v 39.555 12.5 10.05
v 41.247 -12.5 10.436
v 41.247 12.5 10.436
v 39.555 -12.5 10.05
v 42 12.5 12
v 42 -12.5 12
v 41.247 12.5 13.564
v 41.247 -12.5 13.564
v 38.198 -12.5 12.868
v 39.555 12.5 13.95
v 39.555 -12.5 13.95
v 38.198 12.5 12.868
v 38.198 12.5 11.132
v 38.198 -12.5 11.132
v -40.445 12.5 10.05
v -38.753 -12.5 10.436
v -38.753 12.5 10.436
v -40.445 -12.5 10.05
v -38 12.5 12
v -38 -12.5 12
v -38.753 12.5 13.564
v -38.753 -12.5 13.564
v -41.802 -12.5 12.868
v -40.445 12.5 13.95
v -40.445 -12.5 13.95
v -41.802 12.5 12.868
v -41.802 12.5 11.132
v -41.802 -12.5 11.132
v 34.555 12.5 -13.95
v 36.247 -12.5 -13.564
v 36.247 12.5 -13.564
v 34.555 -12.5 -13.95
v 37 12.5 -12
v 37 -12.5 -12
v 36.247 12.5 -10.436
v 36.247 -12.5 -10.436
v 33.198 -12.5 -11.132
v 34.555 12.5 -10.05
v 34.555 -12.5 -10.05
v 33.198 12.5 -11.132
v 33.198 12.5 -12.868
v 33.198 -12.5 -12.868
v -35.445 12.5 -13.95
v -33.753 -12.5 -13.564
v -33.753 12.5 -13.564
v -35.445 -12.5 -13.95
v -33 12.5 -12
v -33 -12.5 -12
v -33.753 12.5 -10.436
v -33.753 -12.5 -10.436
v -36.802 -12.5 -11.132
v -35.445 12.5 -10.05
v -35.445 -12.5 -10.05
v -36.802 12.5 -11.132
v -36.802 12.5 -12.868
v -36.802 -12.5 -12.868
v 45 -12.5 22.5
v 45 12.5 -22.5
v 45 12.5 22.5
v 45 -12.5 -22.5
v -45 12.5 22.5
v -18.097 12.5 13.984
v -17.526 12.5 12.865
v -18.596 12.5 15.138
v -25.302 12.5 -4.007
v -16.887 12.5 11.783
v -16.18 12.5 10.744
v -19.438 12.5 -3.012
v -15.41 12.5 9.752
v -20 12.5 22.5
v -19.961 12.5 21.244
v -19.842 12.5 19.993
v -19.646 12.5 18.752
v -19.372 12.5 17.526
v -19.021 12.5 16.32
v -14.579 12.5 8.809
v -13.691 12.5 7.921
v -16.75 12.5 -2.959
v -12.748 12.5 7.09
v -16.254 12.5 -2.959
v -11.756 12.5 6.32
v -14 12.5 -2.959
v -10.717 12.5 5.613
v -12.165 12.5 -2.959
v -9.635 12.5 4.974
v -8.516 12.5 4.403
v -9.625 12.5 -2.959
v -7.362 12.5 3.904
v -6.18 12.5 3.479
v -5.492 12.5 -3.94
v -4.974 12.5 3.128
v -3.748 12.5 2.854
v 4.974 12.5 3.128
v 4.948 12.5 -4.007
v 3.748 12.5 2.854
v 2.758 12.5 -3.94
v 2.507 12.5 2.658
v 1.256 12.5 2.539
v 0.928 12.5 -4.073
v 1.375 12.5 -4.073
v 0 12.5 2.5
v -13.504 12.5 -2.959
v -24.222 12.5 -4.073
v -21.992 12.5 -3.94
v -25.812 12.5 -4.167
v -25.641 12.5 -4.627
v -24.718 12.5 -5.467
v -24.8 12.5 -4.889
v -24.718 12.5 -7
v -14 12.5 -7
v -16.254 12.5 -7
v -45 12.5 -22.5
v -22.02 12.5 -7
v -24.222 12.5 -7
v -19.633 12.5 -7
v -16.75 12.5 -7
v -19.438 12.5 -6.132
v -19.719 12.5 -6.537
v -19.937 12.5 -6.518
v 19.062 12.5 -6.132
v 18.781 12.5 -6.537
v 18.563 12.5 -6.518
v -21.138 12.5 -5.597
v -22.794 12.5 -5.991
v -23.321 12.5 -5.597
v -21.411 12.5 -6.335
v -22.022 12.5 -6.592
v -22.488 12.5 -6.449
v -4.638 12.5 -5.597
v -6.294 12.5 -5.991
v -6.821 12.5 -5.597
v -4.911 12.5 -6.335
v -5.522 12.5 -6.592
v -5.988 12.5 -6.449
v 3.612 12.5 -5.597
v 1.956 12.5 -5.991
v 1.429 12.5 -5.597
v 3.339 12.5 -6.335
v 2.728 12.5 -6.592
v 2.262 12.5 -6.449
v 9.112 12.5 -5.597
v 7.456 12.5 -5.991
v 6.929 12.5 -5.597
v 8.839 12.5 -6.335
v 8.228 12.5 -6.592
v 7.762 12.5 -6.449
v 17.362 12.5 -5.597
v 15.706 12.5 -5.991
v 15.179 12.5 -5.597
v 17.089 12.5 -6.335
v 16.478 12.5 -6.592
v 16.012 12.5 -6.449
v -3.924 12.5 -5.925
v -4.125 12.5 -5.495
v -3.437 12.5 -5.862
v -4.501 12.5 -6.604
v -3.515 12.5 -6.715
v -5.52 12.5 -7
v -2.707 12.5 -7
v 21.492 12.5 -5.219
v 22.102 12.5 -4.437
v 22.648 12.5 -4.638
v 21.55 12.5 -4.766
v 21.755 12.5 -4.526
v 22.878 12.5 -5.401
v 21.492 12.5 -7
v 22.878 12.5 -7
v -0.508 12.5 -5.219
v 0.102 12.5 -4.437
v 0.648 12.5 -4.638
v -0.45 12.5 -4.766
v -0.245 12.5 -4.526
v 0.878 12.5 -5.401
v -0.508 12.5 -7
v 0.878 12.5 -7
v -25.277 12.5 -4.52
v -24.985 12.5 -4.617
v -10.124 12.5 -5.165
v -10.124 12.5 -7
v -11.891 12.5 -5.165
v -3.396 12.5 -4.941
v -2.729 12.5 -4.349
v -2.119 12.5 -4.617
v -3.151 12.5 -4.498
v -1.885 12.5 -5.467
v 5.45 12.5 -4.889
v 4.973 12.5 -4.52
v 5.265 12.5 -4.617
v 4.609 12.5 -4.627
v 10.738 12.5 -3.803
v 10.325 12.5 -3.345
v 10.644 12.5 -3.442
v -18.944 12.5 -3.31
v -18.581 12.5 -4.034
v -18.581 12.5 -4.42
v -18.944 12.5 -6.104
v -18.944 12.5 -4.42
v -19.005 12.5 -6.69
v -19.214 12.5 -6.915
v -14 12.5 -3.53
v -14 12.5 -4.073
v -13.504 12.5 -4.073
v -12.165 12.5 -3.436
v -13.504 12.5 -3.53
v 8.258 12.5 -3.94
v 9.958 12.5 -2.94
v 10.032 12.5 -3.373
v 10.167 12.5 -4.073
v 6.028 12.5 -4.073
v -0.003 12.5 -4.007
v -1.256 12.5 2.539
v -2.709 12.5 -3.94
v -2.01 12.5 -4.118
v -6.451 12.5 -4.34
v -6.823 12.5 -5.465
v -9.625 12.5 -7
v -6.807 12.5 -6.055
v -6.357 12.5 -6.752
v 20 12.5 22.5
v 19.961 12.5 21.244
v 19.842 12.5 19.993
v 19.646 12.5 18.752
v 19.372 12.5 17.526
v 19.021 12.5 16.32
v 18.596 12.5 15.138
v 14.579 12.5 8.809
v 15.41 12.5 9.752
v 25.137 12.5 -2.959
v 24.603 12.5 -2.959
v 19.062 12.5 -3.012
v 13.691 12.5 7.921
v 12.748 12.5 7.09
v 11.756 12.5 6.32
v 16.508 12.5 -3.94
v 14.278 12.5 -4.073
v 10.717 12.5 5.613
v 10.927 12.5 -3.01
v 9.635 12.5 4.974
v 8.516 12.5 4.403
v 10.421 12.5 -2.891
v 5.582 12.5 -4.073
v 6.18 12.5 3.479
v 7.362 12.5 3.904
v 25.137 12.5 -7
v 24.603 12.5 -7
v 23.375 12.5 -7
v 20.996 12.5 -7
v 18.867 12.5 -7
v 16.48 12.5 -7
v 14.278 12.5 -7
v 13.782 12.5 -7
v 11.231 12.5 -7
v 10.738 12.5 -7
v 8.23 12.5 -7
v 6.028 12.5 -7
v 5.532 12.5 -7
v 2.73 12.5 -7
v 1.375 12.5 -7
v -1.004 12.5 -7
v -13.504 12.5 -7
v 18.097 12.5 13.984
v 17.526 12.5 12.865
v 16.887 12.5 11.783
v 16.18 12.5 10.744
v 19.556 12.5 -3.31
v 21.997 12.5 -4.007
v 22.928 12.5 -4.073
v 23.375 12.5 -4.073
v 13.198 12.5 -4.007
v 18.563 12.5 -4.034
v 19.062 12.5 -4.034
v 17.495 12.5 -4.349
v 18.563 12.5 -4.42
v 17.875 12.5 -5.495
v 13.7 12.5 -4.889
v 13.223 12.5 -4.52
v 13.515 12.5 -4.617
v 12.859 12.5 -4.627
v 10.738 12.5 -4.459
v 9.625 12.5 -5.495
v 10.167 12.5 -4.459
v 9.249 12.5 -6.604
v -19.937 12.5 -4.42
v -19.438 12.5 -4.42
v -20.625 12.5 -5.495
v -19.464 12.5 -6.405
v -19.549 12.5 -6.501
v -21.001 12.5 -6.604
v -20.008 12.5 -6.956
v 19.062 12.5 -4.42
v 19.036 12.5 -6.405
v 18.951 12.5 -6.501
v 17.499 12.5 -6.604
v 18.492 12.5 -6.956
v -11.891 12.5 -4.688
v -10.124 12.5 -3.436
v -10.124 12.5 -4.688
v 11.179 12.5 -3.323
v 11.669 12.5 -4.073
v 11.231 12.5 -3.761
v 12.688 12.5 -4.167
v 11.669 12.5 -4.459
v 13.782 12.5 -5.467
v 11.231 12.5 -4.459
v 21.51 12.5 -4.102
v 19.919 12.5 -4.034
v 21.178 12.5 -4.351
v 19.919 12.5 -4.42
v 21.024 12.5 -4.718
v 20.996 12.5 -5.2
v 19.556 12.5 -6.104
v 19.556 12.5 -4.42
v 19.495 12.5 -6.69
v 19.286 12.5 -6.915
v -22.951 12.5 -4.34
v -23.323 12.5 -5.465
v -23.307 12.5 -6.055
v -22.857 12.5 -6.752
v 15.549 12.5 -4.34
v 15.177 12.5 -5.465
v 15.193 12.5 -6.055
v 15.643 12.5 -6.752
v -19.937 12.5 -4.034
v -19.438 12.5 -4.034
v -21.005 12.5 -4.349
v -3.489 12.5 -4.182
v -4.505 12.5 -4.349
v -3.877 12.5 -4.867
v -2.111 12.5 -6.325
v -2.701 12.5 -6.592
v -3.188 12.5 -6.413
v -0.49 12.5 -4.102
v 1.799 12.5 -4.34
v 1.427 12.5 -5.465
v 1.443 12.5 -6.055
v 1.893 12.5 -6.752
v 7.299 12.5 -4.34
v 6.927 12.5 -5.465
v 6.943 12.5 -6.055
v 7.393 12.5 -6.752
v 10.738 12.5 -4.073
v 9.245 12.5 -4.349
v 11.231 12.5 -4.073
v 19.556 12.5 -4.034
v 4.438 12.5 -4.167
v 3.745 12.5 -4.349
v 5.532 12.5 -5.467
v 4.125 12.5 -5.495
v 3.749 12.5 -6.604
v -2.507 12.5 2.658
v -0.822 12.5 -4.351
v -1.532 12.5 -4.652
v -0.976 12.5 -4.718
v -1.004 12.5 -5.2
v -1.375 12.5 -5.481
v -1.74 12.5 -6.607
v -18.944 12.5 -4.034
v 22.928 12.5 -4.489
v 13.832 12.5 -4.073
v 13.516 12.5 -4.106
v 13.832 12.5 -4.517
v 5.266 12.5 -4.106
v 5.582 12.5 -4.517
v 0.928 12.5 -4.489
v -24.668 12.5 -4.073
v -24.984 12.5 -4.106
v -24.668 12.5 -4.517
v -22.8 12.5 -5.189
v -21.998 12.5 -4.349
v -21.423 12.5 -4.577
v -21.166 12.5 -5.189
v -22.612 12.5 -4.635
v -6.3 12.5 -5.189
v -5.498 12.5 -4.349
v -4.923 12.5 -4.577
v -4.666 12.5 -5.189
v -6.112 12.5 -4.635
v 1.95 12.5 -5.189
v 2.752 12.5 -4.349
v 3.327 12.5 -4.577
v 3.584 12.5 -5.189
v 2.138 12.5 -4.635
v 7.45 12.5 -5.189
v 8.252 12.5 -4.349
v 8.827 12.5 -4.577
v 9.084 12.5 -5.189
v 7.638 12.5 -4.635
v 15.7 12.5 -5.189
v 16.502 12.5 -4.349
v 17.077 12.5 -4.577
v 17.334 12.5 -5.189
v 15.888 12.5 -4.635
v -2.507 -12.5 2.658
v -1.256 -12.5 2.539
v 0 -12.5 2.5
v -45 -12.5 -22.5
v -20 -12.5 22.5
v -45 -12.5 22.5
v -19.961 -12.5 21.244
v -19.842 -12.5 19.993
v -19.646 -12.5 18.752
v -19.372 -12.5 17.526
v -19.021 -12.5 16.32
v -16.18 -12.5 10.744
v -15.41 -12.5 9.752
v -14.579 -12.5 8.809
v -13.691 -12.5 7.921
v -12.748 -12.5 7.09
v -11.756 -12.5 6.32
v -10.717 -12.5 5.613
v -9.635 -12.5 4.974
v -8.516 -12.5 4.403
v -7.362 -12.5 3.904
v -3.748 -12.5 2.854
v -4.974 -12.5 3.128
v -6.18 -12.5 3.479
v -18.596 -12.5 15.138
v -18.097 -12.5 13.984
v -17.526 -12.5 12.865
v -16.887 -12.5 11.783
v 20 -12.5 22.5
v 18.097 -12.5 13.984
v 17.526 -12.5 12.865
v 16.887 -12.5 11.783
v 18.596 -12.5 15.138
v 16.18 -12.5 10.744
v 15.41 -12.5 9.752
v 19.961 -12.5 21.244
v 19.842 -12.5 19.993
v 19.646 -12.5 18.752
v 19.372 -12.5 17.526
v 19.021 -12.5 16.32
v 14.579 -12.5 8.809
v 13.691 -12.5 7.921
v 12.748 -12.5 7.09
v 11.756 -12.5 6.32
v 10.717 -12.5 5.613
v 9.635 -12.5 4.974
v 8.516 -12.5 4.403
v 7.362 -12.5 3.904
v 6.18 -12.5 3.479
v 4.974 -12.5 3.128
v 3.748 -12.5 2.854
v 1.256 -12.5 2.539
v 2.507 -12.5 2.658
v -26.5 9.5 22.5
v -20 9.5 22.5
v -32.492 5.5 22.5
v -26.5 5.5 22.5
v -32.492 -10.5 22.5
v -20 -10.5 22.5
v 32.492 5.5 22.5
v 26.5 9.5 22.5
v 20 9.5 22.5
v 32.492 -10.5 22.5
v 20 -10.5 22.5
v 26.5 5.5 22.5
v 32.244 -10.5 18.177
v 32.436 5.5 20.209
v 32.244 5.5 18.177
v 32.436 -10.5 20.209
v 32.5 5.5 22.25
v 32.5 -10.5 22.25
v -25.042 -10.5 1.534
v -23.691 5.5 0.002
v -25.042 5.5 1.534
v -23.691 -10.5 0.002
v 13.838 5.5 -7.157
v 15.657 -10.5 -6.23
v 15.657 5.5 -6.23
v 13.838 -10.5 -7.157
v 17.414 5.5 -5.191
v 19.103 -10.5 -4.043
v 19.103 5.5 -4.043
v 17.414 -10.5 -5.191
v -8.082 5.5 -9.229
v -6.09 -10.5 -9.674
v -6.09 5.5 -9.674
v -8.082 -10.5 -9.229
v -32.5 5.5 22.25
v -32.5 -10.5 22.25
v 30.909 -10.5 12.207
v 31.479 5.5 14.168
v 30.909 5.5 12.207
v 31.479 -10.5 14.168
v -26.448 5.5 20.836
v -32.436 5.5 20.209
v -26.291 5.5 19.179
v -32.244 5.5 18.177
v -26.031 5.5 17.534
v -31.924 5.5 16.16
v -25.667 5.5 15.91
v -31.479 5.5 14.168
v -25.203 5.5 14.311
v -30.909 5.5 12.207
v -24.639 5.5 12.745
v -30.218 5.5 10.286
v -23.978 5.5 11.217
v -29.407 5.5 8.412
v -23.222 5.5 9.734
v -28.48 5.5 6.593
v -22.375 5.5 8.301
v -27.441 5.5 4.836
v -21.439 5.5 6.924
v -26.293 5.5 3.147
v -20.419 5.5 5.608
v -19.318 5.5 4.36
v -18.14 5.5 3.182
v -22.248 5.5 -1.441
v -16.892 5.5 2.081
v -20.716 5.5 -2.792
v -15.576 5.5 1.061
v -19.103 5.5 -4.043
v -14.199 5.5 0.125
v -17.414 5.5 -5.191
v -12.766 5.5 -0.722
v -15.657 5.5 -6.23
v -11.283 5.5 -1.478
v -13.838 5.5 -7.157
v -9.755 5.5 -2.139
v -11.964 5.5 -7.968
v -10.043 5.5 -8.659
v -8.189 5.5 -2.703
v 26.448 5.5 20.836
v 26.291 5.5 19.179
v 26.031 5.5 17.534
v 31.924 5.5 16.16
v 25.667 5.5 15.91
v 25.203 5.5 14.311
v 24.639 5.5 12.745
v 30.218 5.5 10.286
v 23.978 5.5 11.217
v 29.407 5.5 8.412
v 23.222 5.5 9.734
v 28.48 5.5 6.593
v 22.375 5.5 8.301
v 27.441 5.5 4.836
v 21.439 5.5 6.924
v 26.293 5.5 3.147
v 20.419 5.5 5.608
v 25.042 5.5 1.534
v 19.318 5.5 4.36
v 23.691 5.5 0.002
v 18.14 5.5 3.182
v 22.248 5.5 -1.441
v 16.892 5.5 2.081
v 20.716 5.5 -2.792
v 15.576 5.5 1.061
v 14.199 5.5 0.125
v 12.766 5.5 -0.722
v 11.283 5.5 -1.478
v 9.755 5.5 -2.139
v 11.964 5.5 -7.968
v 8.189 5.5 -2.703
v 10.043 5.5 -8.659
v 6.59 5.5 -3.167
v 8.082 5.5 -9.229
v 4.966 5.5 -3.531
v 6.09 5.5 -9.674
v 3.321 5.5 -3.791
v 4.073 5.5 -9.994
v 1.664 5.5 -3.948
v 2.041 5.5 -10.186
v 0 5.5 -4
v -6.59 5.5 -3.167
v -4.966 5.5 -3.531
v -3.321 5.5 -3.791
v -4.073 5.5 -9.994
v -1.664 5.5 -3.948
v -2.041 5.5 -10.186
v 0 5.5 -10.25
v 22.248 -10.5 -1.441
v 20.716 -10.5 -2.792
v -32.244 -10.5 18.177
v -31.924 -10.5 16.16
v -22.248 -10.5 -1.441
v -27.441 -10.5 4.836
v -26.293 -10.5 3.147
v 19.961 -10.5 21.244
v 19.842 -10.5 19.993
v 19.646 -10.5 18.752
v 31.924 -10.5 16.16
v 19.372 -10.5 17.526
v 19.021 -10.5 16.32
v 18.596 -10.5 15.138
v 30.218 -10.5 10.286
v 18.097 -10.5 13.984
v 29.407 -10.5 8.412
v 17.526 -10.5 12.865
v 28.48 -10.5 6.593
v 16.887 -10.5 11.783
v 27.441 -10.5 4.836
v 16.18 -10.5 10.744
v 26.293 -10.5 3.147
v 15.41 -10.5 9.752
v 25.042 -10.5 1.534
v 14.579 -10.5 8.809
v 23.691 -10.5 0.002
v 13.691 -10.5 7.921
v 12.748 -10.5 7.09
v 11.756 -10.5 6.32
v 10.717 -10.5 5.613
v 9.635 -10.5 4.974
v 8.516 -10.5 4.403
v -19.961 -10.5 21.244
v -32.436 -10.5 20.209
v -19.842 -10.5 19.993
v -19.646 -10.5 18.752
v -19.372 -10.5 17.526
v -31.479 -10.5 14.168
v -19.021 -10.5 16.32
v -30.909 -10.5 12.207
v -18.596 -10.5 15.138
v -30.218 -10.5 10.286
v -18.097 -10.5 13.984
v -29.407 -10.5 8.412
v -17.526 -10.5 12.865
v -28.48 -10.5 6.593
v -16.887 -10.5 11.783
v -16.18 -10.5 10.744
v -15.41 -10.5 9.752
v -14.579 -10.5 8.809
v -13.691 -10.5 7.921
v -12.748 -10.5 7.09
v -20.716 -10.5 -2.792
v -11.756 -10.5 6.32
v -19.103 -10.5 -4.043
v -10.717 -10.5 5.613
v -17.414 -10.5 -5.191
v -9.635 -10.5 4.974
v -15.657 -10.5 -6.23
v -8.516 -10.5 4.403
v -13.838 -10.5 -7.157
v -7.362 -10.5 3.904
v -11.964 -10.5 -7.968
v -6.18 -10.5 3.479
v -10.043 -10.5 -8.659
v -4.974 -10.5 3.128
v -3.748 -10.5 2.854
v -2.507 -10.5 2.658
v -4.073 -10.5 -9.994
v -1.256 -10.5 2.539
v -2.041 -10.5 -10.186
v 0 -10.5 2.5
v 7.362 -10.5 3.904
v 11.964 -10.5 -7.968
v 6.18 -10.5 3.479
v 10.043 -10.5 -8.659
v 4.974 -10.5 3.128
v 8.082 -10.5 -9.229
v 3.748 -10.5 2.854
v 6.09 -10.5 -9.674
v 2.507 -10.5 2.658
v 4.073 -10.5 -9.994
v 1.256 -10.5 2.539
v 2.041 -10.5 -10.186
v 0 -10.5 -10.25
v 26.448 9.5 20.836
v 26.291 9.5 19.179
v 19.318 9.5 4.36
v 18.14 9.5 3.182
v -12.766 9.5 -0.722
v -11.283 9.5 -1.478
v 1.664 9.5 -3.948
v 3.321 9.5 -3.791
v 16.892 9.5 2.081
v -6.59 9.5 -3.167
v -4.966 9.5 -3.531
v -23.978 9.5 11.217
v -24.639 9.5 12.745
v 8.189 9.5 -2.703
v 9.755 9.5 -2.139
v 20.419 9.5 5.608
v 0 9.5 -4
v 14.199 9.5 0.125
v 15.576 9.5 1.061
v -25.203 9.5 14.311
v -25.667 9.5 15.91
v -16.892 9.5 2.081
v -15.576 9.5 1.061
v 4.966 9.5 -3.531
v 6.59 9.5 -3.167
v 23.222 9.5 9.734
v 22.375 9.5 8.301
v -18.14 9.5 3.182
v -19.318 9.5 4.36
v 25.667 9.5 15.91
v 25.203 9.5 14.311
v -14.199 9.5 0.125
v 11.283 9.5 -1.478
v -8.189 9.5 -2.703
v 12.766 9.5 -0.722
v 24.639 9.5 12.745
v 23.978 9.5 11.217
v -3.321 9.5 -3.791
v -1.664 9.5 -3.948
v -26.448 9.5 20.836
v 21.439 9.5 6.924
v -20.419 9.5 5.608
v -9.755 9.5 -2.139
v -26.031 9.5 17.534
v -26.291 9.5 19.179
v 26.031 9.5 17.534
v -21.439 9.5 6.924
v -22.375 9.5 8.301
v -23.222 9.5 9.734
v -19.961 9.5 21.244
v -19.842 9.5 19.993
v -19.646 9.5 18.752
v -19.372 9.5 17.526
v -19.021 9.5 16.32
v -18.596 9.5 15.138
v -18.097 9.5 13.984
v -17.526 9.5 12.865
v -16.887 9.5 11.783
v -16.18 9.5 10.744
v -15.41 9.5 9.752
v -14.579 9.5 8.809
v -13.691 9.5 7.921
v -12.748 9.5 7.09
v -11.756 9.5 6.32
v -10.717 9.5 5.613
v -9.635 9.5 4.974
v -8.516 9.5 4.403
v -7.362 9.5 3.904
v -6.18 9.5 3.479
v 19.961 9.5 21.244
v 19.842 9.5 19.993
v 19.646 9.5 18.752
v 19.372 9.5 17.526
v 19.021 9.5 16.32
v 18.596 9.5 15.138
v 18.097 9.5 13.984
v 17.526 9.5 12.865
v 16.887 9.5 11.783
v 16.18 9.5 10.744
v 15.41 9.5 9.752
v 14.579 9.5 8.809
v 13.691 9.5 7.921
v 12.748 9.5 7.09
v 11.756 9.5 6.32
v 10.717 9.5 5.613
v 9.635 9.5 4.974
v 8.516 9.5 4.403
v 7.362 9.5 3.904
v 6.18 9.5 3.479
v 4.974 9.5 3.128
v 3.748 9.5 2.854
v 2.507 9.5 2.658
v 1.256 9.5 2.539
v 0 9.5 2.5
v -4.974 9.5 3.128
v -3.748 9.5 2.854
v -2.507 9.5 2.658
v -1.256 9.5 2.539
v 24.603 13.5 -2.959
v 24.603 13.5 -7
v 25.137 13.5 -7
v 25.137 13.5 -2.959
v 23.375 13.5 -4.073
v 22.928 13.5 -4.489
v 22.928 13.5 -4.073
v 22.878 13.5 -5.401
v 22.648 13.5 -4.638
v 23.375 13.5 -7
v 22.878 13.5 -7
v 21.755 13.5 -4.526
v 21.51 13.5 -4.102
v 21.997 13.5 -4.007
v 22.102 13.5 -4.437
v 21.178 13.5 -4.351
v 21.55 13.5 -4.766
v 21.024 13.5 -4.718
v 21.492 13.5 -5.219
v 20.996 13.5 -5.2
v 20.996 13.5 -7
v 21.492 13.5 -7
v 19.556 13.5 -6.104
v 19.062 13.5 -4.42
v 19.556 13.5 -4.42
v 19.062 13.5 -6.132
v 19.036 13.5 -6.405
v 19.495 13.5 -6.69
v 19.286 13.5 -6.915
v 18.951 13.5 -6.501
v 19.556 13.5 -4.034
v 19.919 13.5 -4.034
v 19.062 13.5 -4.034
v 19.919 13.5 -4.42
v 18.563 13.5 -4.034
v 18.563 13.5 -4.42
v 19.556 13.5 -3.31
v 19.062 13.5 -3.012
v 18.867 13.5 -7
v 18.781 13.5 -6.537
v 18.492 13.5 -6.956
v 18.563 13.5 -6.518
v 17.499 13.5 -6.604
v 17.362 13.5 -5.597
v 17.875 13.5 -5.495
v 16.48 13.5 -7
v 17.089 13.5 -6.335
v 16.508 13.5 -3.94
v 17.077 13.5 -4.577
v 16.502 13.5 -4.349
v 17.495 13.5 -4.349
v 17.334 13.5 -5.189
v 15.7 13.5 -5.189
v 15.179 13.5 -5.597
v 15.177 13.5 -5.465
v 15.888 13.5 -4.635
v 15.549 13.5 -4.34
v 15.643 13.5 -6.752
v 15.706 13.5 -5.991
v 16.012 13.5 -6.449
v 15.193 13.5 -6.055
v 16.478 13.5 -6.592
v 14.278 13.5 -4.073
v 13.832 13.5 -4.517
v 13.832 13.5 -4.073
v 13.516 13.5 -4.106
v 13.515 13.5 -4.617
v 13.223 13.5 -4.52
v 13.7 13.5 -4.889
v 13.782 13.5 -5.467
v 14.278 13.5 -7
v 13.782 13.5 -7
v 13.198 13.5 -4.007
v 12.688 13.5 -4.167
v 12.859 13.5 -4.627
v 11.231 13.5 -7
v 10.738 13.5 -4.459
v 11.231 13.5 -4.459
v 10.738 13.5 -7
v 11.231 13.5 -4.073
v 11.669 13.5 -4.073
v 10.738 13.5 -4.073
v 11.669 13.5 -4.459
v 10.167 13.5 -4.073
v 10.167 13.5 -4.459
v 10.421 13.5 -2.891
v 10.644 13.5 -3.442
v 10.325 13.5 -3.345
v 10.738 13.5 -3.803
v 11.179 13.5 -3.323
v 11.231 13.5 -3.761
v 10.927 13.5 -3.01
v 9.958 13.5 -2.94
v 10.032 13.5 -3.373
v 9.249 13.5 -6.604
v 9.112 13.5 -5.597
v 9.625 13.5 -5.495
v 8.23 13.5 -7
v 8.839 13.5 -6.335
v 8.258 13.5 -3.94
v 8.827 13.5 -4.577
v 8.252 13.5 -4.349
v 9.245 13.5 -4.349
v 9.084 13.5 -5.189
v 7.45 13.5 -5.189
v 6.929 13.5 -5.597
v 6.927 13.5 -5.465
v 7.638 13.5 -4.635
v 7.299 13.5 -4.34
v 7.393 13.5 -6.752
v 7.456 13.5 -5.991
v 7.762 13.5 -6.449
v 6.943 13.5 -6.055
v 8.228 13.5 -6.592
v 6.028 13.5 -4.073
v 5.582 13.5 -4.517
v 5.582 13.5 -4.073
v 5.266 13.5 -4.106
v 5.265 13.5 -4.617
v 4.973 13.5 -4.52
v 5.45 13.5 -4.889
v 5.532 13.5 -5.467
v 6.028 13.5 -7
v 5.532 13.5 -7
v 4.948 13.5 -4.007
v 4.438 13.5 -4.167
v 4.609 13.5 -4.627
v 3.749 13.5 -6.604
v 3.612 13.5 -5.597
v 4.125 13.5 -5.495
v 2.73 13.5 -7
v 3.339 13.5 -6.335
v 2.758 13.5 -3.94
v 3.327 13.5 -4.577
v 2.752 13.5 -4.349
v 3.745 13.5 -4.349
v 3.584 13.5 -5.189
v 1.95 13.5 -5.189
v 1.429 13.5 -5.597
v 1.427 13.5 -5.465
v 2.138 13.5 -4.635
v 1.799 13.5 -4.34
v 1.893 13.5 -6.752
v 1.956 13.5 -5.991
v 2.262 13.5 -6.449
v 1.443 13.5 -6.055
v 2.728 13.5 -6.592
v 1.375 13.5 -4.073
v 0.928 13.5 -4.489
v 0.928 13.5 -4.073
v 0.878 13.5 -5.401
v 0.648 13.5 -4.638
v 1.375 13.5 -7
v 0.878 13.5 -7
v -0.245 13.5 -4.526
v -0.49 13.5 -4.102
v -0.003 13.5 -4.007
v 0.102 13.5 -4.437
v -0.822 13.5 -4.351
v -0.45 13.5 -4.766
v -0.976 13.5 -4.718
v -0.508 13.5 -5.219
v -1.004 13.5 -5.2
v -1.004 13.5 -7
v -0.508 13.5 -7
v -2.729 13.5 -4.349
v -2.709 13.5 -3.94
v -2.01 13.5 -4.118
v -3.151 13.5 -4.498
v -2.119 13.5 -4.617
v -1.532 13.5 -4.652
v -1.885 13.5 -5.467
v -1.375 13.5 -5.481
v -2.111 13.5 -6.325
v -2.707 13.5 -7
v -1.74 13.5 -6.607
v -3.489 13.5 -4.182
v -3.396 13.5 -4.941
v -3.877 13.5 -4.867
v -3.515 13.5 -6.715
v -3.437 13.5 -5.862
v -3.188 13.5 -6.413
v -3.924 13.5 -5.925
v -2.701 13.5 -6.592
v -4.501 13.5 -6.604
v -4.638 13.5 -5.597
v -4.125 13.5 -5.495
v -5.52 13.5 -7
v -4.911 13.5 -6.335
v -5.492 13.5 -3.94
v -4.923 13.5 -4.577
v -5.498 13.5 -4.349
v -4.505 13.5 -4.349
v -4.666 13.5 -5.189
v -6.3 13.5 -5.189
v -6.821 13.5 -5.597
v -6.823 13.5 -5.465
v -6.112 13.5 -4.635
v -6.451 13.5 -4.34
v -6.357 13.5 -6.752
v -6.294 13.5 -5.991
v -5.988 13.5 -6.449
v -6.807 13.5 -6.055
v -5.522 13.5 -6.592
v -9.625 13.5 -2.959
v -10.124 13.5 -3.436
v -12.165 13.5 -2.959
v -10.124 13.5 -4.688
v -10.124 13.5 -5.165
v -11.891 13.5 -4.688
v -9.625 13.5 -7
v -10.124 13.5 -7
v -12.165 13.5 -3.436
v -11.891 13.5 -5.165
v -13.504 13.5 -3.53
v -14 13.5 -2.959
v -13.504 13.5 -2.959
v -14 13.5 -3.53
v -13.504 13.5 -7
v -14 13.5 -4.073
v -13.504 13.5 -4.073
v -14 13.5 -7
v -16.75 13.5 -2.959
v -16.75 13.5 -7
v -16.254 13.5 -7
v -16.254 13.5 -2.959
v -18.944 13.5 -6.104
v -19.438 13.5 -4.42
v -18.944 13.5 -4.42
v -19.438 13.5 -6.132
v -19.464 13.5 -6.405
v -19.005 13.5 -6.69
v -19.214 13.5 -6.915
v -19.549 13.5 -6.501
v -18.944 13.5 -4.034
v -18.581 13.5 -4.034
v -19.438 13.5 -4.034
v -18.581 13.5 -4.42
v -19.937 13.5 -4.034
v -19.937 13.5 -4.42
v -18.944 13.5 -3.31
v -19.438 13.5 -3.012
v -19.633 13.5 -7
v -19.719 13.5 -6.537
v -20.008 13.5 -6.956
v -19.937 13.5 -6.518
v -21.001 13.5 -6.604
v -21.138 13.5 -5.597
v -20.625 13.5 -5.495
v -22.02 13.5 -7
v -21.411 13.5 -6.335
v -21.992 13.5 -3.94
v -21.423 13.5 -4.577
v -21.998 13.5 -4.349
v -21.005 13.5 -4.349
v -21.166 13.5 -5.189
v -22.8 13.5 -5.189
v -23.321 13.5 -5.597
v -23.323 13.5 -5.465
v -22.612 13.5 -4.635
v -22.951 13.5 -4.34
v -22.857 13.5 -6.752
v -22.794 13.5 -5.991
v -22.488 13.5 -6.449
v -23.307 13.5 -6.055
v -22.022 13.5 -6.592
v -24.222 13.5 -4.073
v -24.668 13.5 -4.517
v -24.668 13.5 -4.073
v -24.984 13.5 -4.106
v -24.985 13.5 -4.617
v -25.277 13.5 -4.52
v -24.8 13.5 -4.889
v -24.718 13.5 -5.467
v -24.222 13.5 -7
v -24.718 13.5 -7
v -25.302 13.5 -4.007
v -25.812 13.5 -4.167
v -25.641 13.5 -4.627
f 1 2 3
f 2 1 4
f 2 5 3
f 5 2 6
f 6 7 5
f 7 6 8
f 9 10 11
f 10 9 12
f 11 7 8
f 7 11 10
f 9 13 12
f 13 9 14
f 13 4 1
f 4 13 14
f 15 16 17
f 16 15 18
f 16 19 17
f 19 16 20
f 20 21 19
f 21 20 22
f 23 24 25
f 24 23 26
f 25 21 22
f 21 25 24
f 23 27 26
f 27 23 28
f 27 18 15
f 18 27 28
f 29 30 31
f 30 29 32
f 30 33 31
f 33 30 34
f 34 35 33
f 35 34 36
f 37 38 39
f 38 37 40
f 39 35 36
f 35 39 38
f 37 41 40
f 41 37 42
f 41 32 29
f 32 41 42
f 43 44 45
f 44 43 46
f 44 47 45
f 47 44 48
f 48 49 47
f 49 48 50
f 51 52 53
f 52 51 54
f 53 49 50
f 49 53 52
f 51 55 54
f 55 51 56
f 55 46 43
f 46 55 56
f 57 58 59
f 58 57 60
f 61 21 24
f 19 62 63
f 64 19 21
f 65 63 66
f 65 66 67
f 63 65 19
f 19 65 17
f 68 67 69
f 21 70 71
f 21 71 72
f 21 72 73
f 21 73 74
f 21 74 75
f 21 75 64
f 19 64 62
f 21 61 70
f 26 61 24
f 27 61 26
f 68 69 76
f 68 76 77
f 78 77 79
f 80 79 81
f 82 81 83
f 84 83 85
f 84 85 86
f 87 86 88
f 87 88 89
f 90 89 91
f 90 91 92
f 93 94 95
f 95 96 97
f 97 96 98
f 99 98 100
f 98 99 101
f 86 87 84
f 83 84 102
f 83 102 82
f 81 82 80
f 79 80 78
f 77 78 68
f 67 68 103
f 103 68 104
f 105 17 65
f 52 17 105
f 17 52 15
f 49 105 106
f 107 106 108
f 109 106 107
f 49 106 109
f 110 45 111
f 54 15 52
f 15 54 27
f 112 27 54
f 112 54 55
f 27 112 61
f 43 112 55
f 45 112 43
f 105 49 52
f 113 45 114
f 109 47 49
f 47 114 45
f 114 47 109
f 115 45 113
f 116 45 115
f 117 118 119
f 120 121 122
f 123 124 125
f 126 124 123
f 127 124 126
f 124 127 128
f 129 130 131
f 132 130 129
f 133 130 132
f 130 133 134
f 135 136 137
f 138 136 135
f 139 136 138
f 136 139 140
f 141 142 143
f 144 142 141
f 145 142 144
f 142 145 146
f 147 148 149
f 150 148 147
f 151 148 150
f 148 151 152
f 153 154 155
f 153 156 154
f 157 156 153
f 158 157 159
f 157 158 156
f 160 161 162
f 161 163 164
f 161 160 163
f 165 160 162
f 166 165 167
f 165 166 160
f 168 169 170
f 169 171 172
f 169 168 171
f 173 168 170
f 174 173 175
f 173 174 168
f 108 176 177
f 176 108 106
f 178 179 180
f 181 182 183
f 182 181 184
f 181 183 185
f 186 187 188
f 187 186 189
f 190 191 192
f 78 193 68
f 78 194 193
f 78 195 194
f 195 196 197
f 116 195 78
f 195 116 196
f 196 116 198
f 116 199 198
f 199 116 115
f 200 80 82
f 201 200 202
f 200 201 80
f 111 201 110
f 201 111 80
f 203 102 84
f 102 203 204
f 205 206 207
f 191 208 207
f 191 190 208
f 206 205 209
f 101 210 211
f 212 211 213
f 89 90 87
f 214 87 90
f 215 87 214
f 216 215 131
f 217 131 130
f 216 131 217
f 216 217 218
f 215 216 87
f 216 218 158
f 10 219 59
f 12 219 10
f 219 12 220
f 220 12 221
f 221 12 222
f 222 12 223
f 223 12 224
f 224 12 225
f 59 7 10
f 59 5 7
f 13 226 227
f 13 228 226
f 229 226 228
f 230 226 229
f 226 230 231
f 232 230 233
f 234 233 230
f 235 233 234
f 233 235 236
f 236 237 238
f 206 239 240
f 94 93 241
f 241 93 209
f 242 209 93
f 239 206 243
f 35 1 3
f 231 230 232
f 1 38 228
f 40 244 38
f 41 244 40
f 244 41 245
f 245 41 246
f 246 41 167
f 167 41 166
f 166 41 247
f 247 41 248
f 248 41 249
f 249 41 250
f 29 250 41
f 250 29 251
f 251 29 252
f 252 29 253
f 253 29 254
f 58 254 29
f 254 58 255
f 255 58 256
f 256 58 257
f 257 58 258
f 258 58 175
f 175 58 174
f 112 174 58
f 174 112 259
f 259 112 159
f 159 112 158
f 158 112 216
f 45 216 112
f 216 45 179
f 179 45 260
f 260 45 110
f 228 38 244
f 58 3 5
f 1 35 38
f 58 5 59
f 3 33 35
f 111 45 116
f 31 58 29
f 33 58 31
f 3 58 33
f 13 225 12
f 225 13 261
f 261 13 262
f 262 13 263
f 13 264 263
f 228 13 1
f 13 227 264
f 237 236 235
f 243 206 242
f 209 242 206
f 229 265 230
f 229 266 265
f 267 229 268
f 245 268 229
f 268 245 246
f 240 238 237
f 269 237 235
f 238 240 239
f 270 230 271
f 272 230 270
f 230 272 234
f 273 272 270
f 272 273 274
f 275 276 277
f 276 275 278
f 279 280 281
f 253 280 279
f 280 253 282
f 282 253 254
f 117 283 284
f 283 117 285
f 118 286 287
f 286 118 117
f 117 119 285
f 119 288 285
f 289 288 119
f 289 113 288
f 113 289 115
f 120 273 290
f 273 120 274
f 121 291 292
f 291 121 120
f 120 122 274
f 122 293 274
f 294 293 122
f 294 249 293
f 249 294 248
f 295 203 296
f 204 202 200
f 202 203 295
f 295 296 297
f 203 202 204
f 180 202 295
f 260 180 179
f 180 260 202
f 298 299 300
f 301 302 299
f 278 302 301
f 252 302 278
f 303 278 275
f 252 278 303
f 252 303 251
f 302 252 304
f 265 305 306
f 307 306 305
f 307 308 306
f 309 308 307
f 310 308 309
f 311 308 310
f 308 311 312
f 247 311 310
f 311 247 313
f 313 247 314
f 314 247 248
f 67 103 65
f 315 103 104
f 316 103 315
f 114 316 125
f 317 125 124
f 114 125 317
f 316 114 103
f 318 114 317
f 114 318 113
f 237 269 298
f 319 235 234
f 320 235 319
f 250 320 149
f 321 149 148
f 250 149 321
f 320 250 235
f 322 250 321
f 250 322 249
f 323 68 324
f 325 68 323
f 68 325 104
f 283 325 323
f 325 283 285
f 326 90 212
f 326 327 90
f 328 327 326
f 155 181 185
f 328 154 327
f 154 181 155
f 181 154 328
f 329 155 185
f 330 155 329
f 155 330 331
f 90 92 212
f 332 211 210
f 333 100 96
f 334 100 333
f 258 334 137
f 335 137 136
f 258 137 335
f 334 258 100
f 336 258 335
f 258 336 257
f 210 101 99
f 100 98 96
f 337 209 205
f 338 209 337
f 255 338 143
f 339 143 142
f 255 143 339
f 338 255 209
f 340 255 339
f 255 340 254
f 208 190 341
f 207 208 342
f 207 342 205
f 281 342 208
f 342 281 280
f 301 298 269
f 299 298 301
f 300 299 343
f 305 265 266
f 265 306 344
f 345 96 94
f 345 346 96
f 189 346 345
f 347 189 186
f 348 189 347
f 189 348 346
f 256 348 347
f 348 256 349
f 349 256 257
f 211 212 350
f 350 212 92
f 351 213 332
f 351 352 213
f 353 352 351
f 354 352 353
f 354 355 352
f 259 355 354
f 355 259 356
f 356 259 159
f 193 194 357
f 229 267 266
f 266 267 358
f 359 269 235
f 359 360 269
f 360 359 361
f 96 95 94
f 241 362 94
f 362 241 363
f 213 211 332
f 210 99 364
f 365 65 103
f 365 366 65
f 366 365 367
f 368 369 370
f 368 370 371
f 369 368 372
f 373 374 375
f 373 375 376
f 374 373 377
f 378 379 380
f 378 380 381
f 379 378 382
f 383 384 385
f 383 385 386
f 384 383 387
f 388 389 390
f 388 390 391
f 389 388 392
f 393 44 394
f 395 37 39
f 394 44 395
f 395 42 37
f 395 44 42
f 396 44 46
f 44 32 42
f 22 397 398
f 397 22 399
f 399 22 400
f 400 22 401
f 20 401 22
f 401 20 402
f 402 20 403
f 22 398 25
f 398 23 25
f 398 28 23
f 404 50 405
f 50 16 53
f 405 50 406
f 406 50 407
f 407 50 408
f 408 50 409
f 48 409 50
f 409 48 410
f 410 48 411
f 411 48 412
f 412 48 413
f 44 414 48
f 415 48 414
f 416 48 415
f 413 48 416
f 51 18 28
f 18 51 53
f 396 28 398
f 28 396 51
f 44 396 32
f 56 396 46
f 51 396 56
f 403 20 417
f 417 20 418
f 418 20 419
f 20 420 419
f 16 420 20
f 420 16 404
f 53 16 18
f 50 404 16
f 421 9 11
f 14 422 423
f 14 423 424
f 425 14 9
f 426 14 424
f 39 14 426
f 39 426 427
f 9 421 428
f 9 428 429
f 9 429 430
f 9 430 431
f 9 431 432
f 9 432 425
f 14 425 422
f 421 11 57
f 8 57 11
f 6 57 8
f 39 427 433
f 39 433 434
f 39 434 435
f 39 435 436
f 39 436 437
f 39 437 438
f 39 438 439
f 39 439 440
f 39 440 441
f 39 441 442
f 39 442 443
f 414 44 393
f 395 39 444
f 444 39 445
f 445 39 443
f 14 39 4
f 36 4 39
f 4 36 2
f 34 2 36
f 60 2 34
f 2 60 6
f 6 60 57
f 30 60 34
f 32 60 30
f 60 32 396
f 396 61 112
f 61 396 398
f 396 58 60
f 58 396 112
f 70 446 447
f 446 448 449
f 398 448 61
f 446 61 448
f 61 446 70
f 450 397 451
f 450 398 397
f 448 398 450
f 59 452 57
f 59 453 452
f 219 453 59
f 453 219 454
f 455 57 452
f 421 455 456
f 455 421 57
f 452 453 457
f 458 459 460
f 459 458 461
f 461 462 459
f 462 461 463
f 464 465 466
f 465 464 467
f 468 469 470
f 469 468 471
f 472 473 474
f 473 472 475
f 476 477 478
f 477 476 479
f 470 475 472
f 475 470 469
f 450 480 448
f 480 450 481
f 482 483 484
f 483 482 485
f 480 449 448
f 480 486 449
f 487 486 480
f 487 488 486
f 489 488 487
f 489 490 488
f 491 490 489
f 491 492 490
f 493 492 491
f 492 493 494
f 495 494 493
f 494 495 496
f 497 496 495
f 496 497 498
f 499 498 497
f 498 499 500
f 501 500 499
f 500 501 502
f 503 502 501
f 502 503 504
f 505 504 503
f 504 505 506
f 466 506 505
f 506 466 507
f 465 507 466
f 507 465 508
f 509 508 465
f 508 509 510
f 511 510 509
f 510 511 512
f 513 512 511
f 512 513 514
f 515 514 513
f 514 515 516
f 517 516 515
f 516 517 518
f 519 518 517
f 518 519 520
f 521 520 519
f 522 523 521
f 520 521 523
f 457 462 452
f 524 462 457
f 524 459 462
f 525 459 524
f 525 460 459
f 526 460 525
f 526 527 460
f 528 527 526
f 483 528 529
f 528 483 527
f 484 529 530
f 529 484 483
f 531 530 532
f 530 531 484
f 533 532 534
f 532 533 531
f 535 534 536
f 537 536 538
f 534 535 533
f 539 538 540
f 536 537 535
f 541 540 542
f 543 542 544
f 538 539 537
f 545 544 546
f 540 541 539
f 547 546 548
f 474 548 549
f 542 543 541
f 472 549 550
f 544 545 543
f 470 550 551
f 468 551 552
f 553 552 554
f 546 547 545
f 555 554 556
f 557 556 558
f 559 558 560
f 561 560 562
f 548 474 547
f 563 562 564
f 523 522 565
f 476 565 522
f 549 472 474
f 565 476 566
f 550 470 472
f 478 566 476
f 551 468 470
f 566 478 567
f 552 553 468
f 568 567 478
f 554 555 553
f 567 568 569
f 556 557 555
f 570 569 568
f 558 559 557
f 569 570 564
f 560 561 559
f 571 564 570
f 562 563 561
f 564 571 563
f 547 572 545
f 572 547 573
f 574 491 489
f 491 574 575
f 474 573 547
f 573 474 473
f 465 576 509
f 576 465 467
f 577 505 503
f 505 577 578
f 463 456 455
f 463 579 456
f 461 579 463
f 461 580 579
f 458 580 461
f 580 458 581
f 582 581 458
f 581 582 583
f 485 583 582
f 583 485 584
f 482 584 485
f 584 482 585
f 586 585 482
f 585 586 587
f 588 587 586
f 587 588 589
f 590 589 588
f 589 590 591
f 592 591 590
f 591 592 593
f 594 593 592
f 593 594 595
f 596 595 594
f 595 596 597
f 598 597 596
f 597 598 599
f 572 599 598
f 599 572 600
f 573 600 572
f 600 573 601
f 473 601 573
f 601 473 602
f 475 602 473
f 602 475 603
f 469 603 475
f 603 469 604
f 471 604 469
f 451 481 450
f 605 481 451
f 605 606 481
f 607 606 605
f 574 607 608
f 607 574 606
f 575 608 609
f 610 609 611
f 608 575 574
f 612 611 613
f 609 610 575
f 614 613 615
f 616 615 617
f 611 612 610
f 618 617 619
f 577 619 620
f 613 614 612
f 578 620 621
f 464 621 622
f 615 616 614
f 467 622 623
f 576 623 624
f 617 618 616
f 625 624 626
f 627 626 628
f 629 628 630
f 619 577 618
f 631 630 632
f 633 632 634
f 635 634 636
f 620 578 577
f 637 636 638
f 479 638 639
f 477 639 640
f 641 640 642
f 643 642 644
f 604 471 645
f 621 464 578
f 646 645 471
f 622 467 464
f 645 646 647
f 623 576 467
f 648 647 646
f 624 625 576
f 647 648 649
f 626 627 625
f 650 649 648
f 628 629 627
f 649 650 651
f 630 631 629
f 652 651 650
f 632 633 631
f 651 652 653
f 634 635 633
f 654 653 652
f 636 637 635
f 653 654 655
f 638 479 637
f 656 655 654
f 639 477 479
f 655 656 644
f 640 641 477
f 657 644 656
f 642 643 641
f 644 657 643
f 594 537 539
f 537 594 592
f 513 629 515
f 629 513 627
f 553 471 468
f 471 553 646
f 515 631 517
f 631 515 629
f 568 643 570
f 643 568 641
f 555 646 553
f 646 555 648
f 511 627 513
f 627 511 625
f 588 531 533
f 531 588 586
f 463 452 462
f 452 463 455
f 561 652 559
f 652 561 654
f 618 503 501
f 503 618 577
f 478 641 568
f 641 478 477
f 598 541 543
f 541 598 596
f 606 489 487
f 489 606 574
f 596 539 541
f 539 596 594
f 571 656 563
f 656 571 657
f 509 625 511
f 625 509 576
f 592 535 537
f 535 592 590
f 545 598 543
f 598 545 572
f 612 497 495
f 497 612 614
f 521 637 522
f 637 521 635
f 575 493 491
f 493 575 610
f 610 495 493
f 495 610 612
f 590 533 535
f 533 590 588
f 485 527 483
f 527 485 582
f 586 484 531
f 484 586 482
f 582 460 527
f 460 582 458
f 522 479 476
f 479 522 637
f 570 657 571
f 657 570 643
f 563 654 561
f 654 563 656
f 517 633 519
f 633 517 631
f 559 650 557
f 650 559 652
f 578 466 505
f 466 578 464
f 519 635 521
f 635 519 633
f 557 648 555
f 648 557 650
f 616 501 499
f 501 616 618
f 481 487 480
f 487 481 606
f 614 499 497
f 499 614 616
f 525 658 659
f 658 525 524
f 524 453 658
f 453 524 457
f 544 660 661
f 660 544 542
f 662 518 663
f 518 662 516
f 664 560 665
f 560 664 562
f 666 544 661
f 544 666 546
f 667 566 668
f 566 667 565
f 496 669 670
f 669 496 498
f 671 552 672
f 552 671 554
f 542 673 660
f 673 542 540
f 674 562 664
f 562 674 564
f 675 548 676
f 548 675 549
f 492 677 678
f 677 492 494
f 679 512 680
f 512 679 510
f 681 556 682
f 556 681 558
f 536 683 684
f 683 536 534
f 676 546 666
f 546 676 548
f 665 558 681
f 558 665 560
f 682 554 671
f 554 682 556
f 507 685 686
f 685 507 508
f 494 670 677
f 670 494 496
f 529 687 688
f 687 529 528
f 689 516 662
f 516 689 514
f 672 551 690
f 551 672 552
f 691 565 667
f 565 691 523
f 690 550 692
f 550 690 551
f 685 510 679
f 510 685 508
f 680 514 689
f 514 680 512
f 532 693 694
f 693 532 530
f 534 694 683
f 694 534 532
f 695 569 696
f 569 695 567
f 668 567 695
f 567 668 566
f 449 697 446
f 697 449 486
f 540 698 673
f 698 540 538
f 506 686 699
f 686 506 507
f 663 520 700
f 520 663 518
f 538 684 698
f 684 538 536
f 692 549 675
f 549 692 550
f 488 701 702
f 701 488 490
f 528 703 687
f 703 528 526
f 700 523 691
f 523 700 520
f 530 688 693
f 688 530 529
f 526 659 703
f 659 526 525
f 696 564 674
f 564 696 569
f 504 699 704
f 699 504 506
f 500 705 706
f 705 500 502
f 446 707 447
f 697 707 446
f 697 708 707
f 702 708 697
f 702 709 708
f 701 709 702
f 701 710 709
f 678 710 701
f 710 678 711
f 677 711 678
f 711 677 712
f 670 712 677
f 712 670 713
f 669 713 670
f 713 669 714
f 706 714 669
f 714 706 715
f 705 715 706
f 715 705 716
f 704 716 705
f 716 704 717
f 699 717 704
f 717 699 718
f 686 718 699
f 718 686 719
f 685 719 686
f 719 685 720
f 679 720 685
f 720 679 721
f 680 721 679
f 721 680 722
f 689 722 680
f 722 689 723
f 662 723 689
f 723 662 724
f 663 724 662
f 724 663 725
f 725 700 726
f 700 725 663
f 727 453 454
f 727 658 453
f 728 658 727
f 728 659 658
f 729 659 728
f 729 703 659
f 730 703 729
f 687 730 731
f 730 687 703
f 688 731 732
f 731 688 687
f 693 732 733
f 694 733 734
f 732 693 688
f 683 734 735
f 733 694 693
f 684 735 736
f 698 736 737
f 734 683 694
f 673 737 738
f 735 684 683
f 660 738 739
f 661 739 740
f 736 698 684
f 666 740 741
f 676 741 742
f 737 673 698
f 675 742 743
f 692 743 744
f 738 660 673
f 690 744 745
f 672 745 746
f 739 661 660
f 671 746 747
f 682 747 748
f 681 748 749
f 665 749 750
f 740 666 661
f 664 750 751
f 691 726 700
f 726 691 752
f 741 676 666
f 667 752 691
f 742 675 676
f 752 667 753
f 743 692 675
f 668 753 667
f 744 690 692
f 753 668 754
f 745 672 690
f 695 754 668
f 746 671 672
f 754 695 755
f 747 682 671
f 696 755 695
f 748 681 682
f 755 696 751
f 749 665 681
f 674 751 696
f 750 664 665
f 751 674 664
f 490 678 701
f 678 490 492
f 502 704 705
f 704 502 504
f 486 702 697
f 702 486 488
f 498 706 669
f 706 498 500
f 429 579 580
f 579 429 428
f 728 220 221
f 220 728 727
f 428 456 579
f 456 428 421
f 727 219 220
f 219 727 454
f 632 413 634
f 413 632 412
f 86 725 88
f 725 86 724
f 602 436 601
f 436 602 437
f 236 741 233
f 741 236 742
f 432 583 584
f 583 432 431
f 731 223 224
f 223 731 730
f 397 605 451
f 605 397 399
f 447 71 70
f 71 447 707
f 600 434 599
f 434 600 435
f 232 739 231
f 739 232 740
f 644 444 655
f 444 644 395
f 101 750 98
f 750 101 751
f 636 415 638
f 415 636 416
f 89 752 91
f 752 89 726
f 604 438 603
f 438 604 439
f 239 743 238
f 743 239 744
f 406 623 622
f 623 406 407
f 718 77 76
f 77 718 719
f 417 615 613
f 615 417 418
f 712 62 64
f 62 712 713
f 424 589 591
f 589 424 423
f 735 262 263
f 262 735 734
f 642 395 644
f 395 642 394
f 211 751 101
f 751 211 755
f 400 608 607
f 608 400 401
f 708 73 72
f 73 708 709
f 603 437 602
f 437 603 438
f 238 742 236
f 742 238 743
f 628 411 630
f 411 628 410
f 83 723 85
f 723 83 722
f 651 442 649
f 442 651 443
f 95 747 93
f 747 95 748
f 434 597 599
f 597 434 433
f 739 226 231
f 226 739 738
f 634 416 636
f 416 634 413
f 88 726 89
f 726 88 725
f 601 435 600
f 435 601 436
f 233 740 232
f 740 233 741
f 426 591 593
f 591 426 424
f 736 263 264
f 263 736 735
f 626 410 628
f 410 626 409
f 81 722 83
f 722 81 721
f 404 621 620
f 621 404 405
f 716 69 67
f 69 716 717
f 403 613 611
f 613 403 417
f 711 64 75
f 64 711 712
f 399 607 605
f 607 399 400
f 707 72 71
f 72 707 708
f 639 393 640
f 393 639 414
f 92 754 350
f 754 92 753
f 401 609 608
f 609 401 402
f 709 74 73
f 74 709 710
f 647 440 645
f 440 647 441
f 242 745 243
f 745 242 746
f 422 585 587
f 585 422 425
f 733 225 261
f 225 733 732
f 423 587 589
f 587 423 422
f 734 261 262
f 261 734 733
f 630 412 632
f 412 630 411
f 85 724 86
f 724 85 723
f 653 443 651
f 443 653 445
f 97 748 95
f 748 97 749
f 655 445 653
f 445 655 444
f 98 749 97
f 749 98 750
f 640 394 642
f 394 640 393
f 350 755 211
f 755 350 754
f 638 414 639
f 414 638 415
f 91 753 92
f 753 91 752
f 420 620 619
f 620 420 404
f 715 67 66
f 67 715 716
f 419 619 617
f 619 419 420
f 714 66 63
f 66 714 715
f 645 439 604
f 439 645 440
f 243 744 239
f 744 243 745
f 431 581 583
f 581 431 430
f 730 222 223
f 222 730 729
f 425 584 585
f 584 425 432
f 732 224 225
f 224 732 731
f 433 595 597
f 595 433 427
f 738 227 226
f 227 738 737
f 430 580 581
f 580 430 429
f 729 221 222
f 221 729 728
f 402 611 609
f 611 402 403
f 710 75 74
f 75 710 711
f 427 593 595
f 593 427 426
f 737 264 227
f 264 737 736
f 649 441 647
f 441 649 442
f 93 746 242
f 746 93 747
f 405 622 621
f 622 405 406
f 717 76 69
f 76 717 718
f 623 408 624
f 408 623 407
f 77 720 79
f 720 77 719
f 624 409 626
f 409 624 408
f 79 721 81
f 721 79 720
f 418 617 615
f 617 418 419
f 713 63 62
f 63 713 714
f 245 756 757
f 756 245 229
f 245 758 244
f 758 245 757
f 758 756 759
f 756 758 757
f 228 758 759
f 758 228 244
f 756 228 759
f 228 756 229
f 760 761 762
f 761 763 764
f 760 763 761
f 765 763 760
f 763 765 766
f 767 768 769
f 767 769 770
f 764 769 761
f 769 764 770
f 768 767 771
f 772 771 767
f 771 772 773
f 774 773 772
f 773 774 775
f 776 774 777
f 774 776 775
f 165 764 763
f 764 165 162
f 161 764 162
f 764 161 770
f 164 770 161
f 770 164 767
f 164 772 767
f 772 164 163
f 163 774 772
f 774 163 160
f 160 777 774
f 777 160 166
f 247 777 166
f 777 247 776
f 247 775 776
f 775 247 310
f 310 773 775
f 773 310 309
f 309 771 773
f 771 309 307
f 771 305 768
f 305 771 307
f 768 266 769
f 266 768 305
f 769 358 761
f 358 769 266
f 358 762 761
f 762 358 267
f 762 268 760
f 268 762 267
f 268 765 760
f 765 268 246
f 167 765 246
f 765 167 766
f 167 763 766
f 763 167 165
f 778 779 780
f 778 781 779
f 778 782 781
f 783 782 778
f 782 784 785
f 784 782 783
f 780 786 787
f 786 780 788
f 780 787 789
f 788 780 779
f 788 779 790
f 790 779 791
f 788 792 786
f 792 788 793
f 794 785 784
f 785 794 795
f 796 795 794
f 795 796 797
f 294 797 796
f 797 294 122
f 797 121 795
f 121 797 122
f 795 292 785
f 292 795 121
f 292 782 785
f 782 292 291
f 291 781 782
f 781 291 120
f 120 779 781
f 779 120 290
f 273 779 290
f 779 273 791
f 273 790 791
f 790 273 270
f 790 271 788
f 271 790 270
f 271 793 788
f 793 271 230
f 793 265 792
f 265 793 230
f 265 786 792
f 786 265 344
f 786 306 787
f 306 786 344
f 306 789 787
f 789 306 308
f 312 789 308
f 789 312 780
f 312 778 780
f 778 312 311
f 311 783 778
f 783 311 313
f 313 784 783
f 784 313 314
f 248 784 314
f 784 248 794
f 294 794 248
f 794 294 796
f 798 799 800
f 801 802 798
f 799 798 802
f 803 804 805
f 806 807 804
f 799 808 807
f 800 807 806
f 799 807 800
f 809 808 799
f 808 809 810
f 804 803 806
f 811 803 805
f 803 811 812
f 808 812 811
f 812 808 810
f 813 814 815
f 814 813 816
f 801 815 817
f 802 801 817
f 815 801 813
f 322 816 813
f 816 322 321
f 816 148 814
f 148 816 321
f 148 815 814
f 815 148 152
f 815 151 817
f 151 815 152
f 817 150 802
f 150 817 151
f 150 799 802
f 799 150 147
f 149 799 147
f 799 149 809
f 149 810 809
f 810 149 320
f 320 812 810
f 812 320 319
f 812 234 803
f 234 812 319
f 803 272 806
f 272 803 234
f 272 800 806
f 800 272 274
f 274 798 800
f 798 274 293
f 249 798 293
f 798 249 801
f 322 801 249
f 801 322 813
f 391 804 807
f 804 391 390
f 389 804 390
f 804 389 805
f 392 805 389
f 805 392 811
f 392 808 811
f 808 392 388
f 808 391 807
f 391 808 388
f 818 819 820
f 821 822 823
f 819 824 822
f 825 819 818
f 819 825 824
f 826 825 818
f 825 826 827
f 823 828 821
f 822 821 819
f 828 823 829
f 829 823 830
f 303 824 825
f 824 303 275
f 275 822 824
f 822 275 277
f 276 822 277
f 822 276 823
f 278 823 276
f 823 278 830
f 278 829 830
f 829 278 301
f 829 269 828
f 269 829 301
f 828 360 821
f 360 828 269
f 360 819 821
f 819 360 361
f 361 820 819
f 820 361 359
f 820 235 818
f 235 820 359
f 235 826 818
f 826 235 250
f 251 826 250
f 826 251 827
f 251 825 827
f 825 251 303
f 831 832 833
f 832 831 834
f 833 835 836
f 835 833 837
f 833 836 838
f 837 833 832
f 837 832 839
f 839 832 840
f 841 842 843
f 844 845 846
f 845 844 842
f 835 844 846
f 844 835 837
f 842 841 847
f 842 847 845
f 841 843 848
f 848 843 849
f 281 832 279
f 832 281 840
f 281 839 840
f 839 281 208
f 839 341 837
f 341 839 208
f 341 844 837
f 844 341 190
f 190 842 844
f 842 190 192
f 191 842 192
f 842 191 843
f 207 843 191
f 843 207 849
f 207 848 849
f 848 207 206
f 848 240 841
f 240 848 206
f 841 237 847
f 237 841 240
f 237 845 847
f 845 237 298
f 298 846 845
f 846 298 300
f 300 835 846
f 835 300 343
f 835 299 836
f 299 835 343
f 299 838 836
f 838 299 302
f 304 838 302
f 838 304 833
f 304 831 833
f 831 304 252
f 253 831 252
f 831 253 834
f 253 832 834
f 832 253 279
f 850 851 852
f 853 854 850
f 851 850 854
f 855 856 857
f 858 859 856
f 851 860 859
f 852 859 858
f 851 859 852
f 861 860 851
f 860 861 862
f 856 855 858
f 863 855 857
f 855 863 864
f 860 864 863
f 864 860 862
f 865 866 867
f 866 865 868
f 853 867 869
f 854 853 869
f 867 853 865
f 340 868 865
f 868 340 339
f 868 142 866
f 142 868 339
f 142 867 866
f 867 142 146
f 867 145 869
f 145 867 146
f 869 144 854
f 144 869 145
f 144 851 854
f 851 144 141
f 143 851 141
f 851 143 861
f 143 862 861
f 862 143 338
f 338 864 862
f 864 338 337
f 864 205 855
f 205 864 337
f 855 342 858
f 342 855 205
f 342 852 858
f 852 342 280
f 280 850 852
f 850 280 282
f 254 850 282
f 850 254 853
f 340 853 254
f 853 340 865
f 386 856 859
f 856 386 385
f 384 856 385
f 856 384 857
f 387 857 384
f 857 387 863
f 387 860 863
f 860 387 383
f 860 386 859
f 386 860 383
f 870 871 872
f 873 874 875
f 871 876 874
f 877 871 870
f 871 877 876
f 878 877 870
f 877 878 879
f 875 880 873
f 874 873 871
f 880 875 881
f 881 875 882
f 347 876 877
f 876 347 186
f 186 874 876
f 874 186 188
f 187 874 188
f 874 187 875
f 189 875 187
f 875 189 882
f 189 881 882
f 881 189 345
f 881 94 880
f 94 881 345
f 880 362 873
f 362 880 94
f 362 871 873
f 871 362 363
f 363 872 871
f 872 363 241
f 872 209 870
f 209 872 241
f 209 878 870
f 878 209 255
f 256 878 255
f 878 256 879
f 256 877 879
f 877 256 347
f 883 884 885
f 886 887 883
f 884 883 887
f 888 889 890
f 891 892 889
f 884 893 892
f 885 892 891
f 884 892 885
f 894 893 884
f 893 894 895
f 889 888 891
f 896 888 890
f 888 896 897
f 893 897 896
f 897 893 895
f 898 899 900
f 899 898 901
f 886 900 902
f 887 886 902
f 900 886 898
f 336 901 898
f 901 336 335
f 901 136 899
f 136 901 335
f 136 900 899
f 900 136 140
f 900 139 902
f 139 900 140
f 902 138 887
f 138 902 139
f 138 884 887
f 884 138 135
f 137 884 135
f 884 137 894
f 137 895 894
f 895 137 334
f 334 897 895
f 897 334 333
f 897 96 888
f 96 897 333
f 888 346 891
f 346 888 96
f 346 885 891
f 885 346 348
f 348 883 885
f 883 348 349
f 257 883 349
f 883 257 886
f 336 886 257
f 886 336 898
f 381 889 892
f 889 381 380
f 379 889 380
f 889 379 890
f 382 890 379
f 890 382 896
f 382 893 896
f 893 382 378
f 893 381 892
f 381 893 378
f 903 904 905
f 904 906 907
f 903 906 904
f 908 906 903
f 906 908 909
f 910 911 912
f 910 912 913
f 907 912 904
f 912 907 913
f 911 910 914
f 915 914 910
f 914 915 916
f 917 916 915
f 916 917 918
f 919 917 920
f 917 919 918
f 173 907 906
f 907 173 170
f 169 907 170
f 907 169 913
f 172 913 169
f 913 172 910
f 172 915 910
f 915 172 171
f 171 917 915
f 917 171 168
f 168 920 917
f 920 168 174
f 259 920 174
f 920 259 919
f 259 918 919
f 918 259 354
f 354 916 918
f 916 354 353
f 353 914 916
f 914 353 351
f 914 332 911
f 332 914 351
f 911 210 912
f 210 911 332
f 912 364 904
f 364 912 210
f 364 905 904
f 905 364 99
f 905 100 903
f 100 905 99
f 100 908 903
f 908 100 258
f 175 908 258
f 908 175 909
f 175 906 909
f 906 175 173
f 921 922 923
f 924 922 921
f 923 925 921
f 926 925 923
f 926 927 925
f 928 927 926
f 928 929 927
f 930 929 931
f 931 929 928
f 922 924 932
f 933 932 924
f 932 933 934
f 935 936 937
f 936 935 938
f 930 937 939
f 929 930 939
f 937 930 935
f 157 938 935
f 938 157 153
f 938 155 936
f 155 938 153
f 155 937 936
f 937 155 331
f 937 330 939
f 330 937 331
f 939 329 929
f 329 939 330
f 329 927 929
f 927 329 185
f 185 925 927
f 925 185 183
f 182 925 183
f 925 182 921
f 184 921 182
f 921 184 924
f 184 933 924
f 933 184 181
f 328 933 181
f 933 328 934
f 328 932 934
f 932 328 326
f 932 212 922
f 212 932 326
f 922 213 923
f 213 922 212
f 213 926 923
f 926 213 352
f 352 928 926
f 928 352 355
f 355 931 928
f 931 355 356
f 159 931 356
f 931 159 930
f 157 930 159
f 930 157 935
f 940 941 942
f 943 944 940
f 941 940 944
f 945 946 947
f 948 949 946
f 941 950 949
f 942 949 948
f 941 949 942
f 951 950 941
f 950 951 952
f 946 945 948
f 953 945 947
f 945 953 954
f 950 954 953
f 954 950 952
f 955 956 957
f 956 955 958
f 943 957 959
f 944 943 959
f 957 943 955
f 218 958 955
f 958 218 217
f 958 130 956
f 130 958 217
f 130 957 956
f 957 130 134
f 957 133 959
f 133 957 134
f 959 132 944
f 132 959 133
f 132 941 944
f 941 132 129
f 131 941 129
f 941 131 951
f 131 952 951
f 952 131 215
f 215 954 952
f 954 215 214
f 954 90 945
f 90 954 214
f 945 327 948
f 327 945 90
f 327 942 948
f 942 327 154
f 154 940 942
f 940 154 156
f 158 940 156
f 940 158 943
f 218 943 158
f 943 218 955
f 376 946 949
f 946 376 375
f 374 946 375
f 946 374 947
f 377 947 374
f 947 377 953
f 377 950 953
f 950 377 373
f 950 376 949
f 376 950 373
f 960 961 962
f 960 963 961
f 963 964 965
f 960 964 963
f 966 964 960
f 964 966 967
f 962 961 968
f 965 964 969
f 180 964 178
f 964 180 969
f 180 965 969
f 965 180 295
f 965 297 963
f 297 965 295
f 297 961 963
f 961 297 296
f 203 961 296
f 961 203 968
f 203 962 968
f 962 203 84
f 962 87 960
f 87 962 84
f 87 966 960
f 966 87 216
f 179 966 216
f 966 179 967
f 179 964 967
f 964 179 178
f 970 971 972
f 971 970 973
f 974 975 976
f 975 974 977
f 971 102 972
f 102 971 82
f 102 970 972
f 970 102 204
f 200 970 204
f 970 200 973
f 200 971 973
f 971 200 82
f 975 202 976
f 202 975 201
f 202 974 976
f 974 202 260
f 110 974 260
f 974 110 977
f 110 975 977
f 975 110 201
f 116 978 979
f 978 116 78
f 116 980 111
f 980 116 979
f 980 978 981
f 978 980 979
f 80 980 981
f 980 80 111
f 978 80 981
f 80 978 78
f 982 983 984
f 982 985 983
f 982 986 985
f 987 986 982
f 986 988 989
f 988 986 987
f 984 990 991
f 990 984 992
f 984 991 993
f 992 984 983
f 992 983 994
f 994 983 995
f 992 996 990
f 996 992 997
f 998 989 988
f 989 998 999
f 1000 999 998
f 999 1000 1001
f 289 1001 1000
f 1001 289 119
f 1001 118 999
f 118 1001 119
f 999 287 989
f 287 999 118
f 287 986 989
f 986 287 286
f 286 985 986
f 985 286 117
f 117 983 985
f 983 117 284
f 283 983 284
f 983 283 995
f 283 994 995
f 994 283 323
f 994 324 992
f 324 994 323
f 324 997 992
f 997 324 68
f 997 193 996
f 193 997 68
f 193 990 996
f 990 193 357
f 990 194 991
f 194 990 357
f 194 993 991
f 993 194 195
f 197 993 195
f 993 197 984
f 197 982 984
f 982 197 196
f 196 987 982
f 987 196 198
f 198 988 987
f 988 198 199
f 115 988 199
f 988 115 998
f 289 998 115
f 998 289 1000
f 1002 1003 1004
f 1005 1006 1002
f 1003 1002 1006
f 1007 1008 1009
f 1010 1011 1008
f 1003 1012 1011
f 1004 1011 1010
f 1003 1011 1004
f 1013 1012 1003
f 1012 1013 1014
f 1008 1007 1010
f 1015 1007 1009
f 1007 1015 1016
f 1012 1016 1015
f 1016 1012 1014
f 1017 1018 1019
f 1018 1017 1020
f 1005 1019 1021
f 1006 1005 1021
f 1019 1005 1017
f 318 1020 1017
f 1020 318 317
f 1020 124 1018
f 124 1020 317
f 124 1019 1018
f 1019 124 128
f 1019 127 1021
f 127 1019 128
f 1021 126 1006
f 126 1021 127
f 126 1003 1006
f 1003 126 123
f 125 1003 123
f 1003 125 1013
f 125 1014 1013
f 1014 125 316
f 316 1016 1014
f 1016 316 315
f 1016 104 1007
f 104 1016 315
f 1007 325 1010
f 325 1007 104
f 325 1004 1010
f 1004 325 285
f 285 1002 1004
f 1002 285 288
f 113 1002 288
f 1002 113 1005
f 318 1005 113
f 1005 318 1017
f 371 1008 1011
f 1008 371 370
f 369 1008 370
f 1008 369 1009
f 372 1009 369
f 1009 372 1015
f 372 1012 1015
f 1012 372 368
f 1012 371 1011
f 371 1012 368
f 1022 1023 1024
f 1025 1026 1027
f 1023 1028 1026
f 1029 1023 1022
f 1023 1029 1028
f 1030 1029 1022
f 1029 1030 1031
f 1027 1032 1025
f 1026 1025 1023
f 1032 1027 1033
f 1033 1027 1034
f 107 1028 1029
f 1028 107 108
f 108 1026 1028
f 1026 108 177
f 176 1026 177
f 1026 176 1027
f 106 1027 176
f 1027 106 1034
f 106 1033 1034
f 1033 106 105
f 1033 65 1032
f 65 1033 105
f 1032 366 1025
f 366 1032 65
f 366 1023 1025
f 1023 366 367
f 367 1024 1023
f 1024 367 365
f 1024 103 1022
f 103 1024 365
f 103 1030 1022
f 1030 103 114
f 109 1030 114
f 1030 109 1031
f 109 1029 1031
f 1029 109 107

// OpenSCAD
// file: filterMount_screwHoles.scad
module upperScrewHoles(){
	//upperMiddleHalf
	translate([40,12,0]) cylinder(h=30,r=2,center=true);
	translate([-40,12,0]) cylinder(h=30,r=2,center=true);
	//upperHalf
	translate([35,-12,0]) cylinder(h=30,r=2,center=true);
	translate([-35,-12,0]) cylinder(h=30,r=2,center=true);
}

module lowerScrewHoles(){
	//lowerMiddleHalf
	translate([40,-12,0]) cylinder(h=30,r=2,center=true);
	translate([-40,-12,0]) cylinder(h=30,r=2,center=true);
	//bottomwHalf
	translate([35,12,0]) cylinder(h=30,r=2,center=true);
	translate([-35,12,0]) cylinder(h=30,r=2,center=true);
}

upperScrewHoles();
lowerScrewHoles();
// main file
use <write.scad>
use <filterMount_screwHoles.scad>

module interferenceFilterMountBottom(){
	//Interference Filter Mount Top
	difference(){
		//mountBody
		color([.6,.1,.6]) cube(size=[90,45,25],center=true);
		//filterBody
		translate([0,-22.25,-2.5]) cylinder(h=16,r=32.5,$fn=100,center=true);
		//filterScrewMount
		translate([0,-22.5,6.5]) cylinder(h=6,r=26.5,$fn=100,center=true);
		//filterHole
		translate([0,-22.5,0]) cylinder(h=30,r=20,$fn=100,center=true);
		//screwHoles
		lowerScrewHoles();
	}
	rotate([0,0,180]){
		translate([0,-5,12]){
			write("Interference Filter",h=4,t=3,center=true);
		}
	}
}

rotate([-90,0,0]){
	translate([0,0,0]){
		interferenceFilterMountBottom();
	}
}
